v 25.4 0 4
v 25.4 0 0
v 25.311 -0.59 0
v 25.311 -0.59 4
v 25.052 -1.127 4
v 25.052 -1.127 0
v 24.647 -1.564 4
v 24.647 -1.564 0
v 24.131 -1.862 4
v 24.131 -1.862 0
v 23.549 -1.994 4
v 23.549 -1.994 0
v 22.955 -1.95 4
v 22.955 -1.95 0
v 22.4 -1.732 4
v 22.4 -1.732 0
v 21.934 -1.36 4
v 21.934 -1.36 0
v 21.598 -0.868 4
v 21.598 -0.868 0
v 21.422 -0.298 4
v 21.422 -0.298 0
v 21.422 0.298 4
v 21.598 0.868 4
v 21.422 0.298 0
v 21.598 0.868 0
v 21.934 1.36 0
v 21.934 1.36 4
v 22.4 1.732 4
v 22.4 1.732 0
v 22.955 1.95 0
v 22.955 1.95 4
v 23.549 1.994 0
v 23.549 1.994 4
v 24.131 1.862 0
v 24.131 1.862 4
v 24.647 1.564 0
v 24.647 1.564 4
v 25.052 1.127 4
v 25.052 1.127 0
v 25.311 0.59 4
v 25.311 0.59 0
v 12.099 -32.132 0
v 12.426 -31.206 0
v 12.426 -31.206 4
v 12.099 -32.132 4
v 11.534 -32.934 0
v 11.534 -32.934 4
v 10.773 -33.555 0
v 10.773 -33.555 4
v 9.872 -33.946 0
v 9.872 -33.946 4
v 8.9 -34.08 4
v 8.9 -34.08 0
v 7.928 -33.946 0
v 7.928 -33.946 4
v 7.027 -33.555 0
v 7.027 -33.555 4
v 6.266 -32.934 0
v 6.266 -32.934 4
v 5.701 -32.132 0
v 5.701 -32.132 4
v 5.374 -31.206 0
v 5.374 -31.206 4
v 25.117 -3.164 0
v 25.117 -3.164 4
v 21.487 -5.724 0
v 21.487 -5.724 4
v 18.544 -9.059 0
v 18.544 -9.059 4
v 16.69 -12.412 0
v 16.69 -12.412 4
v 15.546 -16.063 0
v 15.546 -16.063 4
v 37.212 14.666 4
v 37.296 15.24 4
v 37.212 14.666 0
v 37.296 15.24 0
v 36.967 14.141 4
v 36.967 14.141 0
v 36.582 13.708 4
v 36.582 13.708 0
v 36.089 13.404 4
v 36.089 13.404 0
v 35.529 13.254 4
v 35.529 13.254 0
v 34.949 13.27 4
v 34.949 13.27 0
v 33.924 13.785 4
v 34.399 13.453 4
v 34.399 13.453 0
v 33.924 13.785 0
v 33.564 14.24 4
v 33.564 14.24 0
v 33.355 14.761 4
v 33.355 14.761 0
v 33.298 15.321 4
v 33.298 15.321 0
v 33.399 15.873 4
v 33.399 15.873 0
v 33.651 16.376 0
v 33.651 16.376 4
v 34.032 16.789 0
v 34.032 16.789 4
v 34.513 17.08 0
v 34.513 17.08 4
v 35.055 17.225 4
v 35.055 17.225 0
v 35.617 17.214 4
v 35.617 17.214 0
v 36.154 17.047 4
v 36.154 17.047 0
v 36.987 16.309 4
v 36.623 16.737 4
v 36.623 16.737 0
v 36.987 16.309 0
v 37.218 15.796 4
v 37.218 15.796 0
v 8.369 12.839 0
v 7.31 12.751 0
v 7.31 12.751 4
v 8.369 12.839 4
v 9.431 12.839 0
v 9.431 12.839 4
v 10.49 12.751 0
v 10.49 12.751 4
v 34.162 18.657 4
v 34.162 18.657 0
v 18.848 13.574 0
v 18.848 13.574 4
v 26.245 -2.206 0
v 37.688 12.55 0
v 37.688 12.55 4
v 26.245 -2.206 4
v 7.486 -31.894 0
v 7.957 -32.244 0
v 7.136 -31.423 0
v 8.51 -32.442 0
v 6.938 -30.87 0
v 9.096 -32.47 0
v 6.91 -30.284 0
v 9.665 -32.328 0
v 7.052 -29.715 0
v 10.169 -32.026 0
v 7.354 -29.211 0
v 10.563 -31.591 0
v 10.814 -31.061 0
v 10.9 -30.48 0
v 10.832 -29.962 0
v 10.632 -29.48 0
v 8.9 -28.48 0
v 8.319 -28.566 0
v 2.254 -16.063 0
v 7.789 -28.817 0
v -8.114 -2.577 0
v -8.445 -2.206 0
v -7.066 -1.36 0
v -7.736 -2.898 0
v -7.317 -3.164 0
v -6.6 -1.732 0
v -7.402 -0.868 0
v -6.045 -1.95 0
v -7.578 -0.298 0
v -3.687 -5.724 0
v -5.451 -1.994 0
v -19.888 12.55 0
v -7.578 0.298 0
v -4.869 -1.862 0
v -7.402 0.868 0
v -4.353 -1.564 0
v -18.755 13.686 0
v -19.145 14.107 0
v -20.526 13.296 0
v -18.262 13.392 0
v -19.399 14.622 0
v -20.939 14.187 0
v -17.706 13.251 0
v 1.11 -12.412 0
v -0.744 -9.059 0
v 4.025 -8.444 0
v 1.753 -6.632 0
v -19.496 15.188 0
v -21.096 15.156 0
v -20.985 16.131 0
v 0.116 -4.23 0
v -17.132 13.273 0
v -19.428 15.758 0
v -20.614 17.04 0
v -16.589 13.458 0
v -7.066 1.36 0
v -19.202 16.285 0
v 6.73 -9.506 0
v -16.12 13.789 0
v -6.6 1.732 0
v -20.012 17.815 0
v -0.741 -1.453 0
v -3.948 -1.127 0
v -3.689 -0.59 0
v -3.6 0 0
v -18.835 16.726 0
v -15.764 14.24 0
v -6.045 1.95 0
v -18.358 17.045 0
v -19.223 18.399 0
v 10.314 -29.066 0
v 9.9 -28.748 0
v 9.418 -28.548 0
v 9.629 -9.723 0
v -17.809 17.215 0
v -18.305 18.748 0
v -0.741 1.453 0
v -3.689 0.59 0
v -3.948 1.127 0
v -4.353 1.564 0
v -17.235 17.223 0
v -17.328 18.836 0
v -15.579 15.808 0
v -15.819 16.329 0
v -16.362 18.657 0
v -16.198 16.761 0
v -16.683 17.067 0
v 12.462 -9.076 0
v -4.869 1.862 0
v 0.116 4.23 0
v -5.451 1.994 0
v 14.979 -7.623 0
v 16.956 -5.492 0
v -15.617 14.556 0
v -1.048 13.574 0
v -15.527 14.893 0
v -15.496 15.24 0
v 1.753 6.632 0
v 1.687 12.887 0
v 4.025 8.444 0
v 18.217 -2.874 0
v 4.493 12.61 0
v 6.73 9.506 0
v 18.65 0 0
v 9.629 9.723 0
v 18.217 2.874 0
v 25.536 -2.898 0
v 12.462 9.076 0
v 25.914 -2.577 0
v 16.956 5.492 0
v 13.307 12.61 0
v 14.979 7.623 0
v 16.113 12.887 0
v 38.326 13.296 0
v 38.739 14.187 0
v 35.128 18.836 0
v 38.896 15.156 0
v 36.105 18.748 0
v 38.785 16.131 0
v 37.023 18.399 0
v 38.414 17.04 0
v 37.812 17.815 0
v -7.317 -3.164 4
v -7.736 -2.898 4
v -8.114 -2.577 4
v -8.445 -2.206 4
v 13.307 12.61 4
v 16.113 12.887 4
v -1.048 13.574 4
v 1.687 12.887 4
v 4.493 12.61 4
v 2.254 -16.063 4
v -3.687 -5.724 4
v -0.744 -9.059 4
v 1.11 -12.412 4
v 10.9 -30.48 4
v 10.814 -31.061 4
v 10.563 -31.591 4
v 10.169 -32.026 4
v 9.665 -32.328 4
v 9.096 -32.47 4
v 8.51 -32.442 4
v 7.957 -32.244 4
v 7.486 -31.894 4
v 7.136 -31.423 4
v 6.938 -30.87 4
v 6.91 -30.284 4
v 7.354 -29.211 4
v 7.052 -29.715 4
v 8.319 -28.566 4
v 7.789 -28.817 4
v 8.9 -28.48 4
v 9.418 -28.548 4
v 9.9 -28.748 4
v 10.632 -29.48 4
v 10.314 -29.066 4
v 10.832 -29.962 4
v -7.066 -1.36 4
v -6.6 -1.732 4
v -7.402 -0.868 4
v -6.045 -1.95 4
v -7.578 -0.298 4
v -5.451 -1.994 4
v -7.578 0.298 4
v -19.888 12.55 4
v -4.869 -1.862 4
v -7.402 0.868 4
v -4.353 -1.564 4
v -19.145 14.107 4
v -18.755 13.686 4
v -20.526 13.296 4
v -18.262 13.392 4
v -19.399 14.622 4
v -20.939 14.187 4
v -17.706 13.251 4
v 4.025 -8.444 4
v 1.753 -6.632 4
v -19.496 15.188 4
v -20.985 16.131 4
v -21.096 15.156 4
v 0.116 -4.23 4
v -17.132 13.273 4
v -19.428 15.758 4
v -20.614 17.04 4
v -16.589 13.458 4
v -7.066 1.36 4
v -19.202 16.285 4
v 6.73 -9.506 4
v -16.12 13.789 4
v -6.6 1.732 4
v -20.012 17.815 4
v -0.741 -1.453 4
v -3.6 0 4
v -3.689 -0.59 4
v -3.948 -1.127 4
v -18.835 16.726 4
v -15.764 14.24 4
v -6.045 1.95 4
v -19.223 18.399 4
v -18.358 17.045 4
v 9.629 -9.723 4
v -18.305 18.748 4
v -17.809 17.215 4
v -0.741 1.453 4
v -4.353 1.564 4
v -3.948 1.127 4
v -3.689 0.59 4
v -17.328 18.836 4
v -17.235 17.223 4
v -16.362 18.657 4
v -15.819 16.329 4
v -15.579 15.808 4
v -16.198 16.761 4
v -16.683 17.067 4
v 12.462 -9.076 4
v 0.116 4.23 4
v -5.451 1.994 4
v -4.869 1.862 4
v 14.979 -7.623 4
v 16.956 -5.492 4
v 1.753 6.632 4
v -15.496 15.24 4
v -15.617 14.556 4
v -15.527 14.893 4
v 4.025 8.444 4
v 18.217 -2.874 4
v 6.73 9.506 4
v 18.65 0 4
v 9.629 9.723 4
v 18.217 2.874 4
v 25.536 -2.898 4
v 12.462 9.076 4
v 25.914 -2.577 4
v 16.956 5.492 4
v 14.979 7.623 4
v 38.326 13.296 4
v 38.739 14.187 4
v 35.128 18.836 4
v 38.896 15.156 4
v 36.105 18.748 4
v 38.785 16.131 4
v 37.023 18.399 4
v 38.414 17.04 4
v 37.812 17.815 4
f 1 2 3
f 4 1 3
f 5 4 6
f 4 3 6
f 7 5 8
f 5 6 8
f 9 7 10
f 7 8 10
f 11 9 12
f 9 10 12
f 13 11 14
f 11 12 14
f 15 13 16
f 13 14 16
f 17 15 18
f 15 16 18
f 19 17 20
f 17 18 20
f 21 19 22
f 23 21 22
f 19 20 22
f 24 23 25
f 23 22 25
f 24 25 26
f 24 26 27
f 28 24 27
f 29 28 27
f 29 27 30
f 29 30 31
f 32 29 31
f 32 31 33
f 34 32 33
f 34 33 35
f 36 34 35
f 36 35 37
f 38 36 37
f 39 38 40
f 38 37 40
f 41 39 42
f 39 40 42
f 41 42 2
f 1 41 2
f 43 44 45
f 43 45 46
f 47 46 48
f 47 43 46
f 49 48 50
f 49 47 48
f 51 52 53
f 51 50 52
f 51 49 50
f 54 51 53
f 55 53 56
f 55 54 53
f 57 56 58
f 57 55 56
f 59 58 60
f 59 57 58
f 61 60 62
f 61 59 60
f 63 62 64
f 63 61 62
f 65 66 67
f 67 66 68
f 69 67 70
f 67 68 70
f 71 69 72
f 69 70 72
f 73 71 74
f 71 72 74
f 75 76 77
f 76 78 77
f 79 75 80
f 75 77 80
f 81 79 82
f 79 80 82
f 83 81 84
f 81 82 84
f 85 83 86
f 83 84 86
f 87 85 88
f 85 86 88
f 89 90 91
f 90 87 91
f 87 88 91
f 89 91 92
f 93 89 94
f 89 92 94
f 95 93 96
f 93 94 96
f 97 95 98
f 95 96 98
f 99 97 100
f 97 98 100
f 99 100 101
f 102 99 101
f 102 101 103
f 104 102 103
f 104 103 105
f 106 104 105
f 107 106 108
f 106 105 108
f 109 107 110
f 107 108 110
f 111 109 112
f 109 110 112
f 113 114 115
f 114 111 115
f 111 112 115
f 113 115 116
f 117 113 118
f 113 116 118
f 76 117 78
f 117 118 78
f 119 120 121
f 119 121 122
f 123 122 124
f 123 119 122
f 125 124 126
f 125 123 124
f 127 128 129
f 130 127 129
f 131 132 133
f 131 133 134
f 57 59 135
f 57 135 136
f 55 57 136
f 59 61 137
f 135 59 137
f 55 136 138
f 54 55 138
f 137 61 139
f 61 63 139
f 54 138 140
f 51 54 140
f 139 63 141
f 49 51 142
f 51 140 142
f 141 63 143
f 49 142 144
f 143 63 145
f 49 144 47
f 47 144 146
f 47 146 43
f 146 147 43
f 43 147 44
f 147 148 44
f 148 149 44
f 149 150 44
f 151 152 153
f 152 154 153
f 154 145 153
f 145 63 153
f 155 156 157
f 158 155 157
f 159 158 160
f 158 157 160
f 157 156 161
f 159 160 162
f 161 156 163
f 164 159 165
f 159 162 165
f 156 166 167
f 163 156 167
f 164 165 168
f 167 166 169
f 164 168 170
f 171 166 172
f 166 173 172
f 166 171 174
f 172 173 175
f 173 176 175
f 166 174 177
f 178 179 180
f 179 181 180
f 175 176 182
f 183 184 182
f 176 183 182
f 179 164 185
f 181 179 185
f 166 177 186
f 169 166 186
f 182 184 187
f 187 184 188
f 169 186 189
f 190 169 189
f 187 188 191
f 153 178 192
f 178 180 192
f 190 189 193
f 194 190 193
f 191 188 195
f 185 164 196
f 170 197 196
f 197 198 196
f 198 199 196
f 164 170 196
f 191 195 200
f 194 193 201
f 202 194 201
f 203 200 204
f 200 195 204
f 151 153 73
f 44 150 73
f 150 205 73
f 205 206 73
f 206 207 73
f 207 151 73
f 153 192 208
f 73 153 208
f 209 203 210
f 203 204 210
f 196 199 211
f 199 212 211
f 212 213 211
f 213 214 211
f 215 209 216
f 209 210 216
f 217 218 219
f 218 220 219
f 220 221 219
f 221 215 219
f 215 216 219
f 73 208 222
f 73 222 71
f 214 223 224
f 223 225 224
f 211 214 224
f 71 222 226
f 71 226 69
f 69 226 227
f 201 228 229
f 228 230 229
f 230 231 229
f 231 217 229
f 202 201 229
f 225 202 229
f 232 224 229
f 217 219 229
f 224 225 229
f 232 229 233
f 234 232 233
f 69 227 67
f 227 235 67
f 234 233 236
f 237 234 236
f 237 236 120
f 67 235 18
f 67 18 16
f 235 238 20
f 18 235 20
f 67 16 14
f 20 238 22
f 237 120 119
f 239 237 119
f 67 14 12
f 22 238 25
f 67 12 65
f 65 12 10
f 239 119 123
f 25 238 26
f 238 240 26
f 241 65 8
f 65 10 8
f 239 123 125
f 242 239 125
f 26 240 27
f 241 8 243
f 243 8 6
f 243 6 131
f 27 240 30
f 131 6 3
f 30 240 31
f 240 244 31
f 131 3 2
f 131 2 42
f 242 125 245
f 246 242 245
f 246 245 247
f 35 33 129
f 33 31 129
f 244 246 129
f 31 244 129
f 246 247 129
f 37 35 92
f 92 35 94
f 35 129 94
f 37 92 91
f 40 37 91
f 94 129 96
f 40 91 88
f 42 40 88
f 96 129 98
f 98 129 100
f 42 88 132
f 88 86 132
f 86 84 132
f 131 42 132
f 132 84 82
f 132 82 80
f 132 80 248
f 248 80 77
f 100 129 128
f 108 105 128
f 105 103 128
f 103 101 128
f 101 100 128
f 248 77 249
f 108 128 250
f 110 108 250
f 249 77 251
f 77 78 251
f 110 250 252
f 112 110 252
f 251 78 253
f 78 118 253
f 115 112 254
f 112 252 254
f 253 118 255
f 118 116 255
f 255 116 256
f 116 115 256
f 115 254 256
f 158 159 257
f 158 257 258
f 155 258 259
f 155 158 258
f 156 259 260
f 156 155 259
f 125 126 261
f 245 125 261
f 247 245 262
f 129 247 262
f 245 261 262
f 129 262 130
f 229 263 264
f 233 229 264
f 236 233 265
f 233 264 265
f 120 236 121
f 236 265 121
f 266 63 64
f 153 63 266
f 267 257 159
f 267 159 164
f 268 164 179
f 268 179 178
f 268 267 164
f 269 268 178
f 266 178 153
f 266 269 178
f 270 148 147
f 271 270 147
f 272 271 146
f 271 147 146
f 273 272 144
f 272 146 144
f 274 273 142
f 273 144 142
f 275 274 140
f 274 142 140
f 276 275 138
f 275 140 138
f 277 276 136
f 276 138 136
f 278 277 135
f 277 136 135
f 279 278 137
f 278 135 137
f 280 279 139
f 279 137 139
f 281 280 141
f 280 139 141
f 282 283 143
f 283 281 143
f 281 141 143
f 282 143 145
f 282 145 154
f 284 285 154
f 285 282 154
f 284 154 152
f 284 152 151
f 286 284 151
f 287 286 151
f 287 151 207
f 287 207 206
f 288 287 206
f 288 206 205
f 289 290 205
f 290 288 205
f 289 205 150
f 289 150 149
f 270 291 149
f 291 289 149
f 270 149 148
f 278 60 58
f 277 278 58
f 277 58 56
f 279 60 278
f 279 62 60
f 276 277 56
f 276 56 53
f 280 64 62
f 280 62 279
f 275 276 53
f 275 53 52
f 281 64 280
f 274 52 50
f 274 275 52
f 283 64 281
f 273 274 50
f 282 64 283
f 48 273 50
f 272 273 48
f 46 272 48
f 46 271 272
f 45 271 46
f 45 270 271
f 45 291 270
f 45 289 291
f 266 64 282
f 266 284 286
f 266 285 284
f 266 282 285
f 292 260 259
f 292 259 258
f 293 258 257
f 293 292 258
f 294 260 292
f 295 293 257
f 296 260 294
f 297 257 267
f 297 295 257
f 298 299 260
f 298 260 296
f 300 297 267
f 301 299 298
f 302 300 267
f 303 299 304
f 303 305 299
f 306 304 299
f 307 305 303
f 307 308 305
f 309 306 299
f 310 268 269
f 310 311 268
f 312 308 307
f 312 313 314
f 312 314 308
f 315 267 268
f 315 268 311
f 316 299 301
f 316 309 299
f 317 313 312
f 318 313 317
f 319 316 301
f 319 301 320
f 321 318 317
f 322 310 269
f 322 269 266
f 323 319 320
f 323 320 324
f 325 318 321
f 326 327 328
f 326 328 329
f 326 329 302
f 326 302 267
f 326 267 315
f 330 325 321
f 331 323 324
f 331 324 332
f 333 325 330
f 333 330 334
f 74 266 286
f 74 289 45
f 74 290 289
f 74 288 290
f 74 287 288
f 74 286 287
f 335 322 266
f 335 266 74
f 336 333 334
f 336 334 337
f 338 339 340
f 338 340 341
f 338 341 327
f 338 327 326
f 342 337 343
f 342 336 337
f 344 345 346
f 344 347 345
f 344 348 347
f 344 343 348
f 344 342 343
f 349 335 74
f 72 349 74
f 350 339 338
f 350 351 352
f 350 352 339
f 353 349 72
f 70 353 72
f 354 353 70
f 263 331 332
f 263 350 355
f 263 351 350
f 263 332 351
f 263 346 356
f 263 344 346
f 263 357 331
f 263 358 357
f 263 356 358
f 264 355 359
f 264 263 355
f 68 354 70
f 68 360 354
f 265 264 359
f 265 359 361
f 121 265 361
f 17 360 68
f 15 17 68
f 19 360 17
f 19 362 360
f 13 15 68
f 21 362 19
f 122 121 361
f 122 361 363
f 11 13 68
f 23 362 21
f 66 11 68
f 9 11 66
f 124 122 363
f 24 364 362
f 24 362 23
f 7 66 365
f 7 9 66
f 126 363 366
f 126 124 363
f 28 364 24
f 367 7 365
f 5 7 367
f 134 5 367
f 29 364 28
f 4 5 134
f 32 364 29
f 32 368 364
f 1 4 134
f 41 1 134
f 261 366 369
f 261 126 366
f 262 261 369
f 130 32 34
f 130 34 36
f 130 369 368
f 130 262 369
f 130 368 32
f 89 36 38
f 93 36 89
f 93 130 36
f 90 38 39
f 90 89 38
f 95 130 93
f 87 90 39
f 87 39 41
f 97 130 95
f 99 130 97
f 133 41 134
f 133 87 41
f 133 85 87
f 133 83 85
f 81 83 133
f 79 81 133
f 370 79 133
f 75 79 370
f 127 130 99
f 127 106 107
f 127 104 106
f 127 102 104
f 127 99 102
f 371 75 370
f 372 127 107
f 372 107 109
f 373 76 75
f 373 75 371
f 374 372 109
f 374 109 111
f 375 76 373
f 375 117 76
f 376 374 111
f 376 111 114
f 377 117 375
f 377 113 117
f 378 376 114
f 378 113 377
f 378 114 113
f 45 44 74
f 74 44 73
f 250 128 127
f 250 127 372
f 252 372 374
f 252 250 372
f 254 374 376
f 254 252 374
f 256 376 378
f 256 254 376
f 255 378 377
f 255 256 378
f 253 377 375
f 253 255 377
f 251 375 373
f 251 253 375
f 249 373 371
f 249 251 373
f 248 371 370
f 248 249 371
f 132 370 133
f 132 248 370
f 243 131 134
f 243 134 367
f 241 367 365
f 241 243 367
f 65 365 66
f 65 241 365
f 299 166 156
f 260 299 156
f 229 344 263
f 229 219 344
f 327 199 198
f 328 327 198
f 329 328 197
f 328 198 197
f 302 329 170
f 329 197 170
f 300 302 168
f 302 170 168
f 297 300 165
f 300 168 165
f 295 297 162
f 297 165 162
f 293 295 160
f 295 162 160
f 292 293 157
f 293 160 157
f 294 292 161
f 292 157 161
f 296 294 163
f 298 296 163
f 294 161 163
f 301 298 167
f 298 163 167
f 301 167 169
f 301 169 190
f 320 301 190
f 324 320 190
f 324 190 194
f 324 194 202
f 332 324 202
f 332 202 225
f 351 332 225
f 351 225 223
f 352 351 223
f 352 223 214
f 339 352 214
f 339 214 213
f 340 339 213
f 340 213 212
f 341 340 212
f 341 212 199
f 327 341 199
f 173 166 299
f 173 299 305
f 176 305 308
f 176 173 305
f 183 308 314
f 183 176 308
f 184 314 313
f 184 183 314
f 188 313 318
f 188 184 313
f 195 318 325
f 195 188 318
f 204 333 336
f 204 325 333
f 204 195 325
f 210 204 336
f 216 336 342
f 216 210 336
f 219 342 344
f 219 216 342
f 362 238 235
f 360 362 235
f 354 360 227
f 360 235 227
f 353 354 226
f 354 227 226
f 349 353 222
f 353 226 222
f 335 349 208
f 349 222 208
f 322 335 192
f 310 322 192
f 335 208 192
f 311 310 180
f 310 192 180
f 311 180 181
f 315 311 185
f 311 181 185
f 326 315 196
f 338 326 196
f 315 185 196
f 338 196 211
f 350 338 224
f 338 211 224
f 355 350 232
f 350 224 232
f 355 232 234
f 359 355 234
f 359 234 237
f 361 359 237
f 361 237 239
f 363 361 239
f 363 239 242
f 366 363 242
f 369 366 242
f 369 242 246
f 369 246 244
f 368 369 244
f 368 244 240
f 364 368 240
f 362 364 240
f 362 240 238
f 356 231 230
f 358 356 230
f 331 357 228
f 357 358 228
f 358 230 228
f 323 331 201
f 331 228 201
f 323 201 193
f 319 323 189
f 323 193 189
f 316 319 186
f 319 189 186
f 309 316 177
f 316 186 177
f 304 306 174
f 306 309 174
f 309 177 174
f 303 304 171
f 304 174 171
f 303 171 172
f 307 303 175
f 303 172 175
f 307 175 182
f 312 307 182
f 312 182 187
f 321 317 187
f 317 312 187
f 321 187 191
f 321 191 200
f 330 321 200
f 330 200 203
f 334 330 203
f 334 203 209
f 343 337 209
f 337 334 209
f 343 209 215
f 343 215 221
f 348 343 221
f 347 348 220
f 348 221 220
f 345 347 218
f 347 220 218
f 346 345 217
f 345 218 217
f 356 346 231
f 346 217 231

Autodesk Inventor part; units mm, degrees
ref_plane "YZ Plane" through (0, 0, 0) normal (1, 0, 0) x (0, 1, 0)
ref_plane "XZ Plane" through (0, 0, 0) normal (0, 1, 0) x (-1, 0, 0)
ref_plane "XY Plane" through (0, 0, 0) normal (0, 0, 1) x (1, 0, 0)
sketch "Sketch1" plane through (0, 0, 0) normal (0, 0, 1) x (1, 0, 0)
  circle A0 centre (8.9, 0) radius 18.65 projected
  circle A1 centre (23.4, 0) radius 1.65 projected
  circle A2 centre (-5.6, 0) radius 1.65 projected
  arc A3 (13.951, -13.4327) -> (21.5237, -6.826) centre (8.9, 0) ccw projected
  arc A4 (22.3604, -6.5571) -> (21.5237, -6.826) centre (22.0823, -7.128) ccw projected
  line L0 (22.3604, -6.5571) -> (23.5602, -7.1416) projected
  arc A5 (23.8417, -8.0126) -> (23.5602, -7.1416) centre (23.2821, -7.7125) ccw projected
  arc A6 (14.8123, -15.8902) -> (23.8417, -8.0126) centre (8.9, 0) ccw projected
  arc A7 (13.9876, -15.4932) -> (14.8123, -15.8902) centre (14.5909, -15.2951) ccw projected
  line L1 (13.9876, -15.4932) -> (13.5712, -14.2252) projected
  arc A8 (13.951, -13.4327) -> (13.5712, -14.2252) centre (14.1745, -14.0271) ccw projected
  line L2 (-4.5604, 6.5571) -> (-5.7602, 7.1416) projected
  arc A9 (-6.0417, 8.0126) -> (-5.7602, 7.1416) centre (-5.4821, 7.7125) ccw projected
  arc A10 (2.9877, 15.8902) -> (-6.0417, 8.0126) centre (8.9, 0) ccw projected
  arc A11 (3.8124, 15.4932) -> (2.9877, 15.8902) centre (3.2091, 15.2951) ccw projected
  line L3 (3.8124, 15.4932) -> (4.2288, 14.2252) projected
  arc A12 (3.849, 13.4327) -> (4.2288, 14.2252) centre (3.6255, 14.0271) ccw projected
  arc A13 (3.849, 13.4327) -> (-3.7237, 6.826) centre (8.9, 0) ccw projected
  arc A14 (-4.5604, 6.5571) -> (-3.7237, 6.826) centre (-4.2823, 7.128) ccw projected
  circle A15 centre (8.9, 0) radius 8.75 projected
  line L4 (22.3604, 6.5571) -> (23.5602, 7.1416) projected
  arc A16 (21.5237, 6.826) -> (22.3604, 6.5571) centre (22.0823, 7.128) ccw projected
  arc A17 (21.5237, 6.826) -> (13.951, 13.4327) centre (8.9, 0) ccw projected
  arc A18 (13.5712, 14.2252) -> (13.951, 13.4327) centre (14.1745, 14.0271) ccw projected
  line L5 (13.9876, 15.4932) -> (13.5712, 14.2252) projected
  arc A19 (14.8123, 15.8902) -> (13.9876, 15.4932) centre (14.5909, 15.2951) ccw projected
  arc A20 (23.8417, 8.0126) -> (14.8123, 15.8902) centre (8.9, 0) ccw projected
  arc A21 (23.5602, 7.1416) -> (23.8417, 8.0126) centre (23.2821, 7.7125) ccw projected
  line L6 (-4.5604, -6.5571) -> (-5.7602, -7.1416) projected
  arc A22 (-3.7237, -6.826) -> (-4.5604, -6.5571) centre (-4.2823, -7.128) ccw projected
  arc A23 (-3.7237, -6.826) -> (3.849, -13.4327) centre (8.9, 0) ccw projected
  arc A24 (4.2288, -14.2252) -> (3.849, -13.4327) centre (3.6255, -14.0271) ccw projected
  line L7 (3.8124, -15.4932) -> (4.2288, -14.2252) projected
  arc A25 (2.9877, -15.8902) -> (3.8124, -15.4932) centre (3.2091, -15.2951) ccw projected
  arc A26 (-6.0417, -8.0126) -> (2.9877, -15.8902) centre (8.9, 0) ccw projected
  arc A27 (-5.7602, -7.1416) -> (-6.0417, -8.0126) centre (-5.4821, -7.7125) ccw projected
  circle A28 centre (-5.6, 0) radius 1.65
  circle A29 centre (23.4, 0) radius 1.65
  circle A30 centre (8.9, 0) radius 9.75
  line L8 (8.9, 0) -> (8.9, -30.48)
  circle A31 centre (8.9, -30.48) radius 2
  circle A32 centre (8.9, -30.48) radius 3.6
  line L9 (5.374, -31.2064) -> (-0.6495, -1.9673)
  line L10 (12.426, -31.2064) -> (18.4495, -1.9673)
  circle A33 centre (35.2965, 15.24) radius 2
  circle A34 centre (35.2965, 15.24) radius 3.6
  line L11 (8.9, 0) -> (35.2965, 15.24)
  line L12 (34.1625, 18.6568) -> (5.829, 9.2537)
  line L13 (37.6885, 12.5496) -> (15.3784, -7.2864)
  circle A35 centre (-17.4965, 15.24) radius 2
  circle A36 centre (-17.4965, 15.24) radius 3.6
  line L14 (8.9, 0) -> (-17.4965, 15.24)
  line L15 (-19.8885, 12.5496) -> (2.4216, -7.2864)
  line L16 (-16.3625, 18.6568) -> (11.971, 9.2537)
  circle A37 centre (-5.6, 0) radius 2
  circle A38 centre (-5.6, 0) radius 3.6
  circle A39 centre (23.4, 0) radius 2
  circle A40 centre (23.4, 0) radius 3.6
  line L17 (0.0034, -5.1364) -> (-6.4857, -3.4893)
  line L18 (-19.8885, 12.5496) -> (-8.4448, -2.2062)
  line L19 (37.6885, 12.5496) -> (26.2448, -2.2062)
  line L20 (17.7966, -5.1364) -> (24.2857, -3.4893)
  circle A41 centre (8.9, 0) radius 12.85
  point P0 (0, 0)
  point P1 (15.6508, -15.5526)
  point P2 (16.3247, -12.2811)
  point P3 (8.9, 10.2729)
  point P4 (1.4753, -12.2811)
  point P5 (2.1492, -15.5526)
  point P6 (13.7731, 11.8901)
  point P7 (4.0269, 11.8901)
  point P8 (16.7606, -10.1653)
  point P9 (21.001, -4.3231)
  point P10 (-3.201, -4.3231)
  point P11 (1.0394, -10.1653)
  dimension "d0" = 1
  dimension "d1" = 4
  dimension "d2" = 7.2
  dimension "d3" = 30.48
  dimension "d6" = 360
  dimension "d8" = 4
  dimension "d9" = 7.2
  dimension "d10" = 4
  dimension "d11" = 7.2
extrude "Extrusion1" add sketch "Sketch1" along normal blind 4 contours A0 L19 A40 L13 | A0 L13 L19 | L13 A40 A41 L11 A17 A16 L4 A21 A20 A0 | A0 L11 A34 L13 | L11 A20 L12 A0 | A0 L12 A34 L11 | A34 | A40 A41 L13 A39 | L13 A39 A41 A40 | L10 A32 L8 A0 | A0 L8 A41 L10 A3 A8 L1 A7 A6 | L11 A17 L12 A20 | A20 A21 L4 A16 A17 L11 | A41 A39 L13 A40 | A40 L13 L10 A30 L11 A41 | L8 A32 L9 A0 | A0 L9 A26 A25 L7 A24 A23 A41 L8 | A32 | A6 A7 L1 A8 A3 L10 | L20 A41 A40 | L16 A10 L14 A0 | A0 L14 A36 L16 | L11 A41 L12 A17 | A40 A41 L20 L13 | L13 A41 A40 | L11 A30 L16 L12 A41 | A41 L9 L15 A30 L8 | L8 A30 L13 L10 A41 | A41 L10 L20 | L14 A10 A9 L2 A14 A13 A41 A38 L15 A0 | A0 L15 A36 L14 | A36 | L16 A13 L14 A10 | L13 A41 A39 | L13 A30 L10 | L12 L16 A41 | L18 L15 A0 | A0 L15 A38 L18 | L9 A23 A24 L7 A25 A26 | A41 L17 L9 | L14 A13 A14 L2 A9 A10 | L16 A41 L14 A13 | A30 L12 L16 | L12 A30 L14 A41 L16 | A38 L15 A37 A41 | L15 L9 A30 | L15 A38 A41 L14 A30 L9 | L17 A41 A38 L15 | L17 A38 A41 | A38 A41 A37 L15 | A38 A41 L15 | L15 A41 A37 A38 | L15 A37 A41
fillet "Fillet1" radius 19.05 6 edges at (-3.201, -4.3231, 2) (1.0394, -10.1653, 2) (4.0269, 11.8901, 2) (13.7731, 11.8901, 2) (21.001, -4.3231, 2) (16.7606, -10.1653, 2)
sketch "Sketch2" plane through (0, 0, 4) normal (0, 0, 1) x (1, 0, 0)
  arc A0 (5.4731, -1.5453) -> (4.2552, -2.5573) centre (5.9714, -3.384) ccw projected
  arc A1 (4.2552, -2.5573) -> (4.6178, -3.1268) centre (8.9, 0) ccw projected
  arc A2 (4.6178, -3.1268) -> (6.05, -2.4513) centre (4.5948, -1.2219) ccw projected
  arc A3 (6.05, -2.4513) -> (6.7049, -3.0517) centre (8.9, 0) ccw projected
  arc A4 (6.7049, -3.0517) -> (6.1561, -4.5371) centre (8.0558, -4.3949) ccw projected
  arc A5 (6.1561, -4.5371) -> (6.7549, -4.849) centre (8.9, 0) ccw projected
  arc A6 (6.7549, -4.849) -> (7.6574, -3.5479) centre (5.7825, -3.2108) ccw projected
  arc A7 (7.6574, -3.5479) -> (8.5249, -3.7404) centre (8.9, 0) ccw projected
  arc A8 (8.5249, -3.7404) -> (8.7922, -5.3012) centre (10.3664, -4.2282) ccw projected
  arc A9 (8.7922, -5.3012) -> (9.4668, -5.2719) centre (8.9, 0) ccw projected
  arc A10 (9.4668, -5.2719) -> (9.5979, -3.6939) centre (7.8056, -4.3394) ccw projected
  arc A11 (9.5979, -3.6939) -> (10.4453, -3.4269) centre (8.9, 0) ccw projected
  arc A12 (10.4453, -3.4269) -> (11.4573, -4.6448) centre (12.284, -2.9286) ccw projected
  arc A13 (11.4573, -4.6448) -> (12.0268, -4.2822) centre (8.9, 0) ccw projected
  arc A14 (12.0268, -4.2822) -> (11.3513, -2.85) centre (10.1219, -4.3052) ccw projected
  arc A15 (11.3513, -2.85) -> (11.9517, -2.1951) centre (8.9, 0) ccw projected
  arc A16 (11.9517, -2.1951) -> (13.4371, -2.7439) centre (13.2949, -0.8442) ccw projected
  arc A17 (13.4371, -2.7439) -> (13.749, -2.1451) centre (8.9, 0) ccw projected
  arc A18 (13.749, -2.1451) -> (12.4479, -1.2426) centre (12.1108, -3.1175) ccw projected
  arc A19 (12.4479, -1.2426) -> (12.6404, -0.3751) centre (8.9, 0) ccw projected
  arc A20 (12.6404, -0.3751) -> (14.2012, -0.1078) centre (13.1282, 1.4664) ccw projected
  arc A21 (14.2012, -0.1078) -> (14.1719, 0.5668) centre (8.9, 0) ccw projected
  arc A22 (14.1719, 0.5668) -> (12.5939, 0.6979) centre (13.2394, -1.0944) ccw projected
  arc A23 (12.5939, 0.6979) -> (12.3269, 1.5453) centre (8.9, 0) ccw projected
  arc A24 (12.3269, 1.5453) -> (13.5448, 2.5573) centre (11.8286, 3.384) ccw projected
  arc A25 (13.5448, 2.5573) -> (13.1822, 3.1268) centre (8.9, 0) ccw projected
  arc A26 (13.1822, 3.1268) -> (11.75, 2.4513) centre (13.2052, 1.2219) ccw projected
  arc A27 (11.75, 2.4513) -> (11.0951, 3.0517) centre (8.9, 0) ccw projected
  arc A28 (11.0951, 3.0517) -> (11.6439, 4.5371) centre (9.7442, 4.3949) ccw projected
  arc A29 (11.6439, 4.5371) -> (11.0451, 4.849) centre (8.9, 0) ccw projected
  arc A30 (11.0451, 4.849) -> (10.1426, 3.5479) centre (12.0175, 3.2108) ccw projected
  arc A31 (10.1426, 3.5479) -> (9.2751, 3.7404) centre (8.9, 0) ccw projected
  arc A32 (9.2751, 3.7404) -> (9.0078, 5.3012) centre (7.4336, 4.2282) ccw projected
  arc A33 (9.0078, 5.3012) -> (8.3332, 5.2719) centre (8.9, 0) ccw projected
  arc A34 (8.3332, 5.2719) -> (8.2021, 3.6939) centre (9.9944, 4.3394) ccw projected
  arc A35 (8.2021, 3.6939) -> (7.3547, 3.4269) centre (8.9, 0) ccw projected
  arc A36 (7.3547, 3.4269) -> (6.3427, 4.6448) centre (5.516, 2.9286) ccw projected
  arc A37 (6.3427, 4.6448) -> (5.7732, 4.2822) centre (8.9, 0) ccw projected
  arc A38 (5.7732, 4.2822) -> (6.4487, 2.85) centre (7.6781, 4.3052) ccw projected
  arc A39 (6.4487, 2.85) -> (5.8483, 2.1951) centre (8.9, 0) ccw projected
  arc A40 (5.8483, 2.1951) -> (4.3629, 2.7439) centre (4.5051, 0.8442) ccw projected
  arc A41 (4.3629, 2.7439) -> (4.051, 2.1451) centre (8.9, 0) ccw projected
  arc A42 (4.051, 2.1451) -> (5.3521, 1.2426) centre (5.6892, 3.1175) ccw projected
  arc A43 (5.3521, 1.2426) -> (5.1596, 0.3751) centre (8.9, 0) ccw projected
  arc A44 (5.1596, 0.3751) -> (3.5988, 0.1078) centre (4.6718, -1.4664) ccw projected
  arc A45 (3.5988, 0.1078) -> (3.6281, -0.5668) centre (8.9, 0) ccw projected
  arc A46 (3.6281, -0.5668) -> (5.2061, -0.6979) centre (4.5606, 1.0944) ccw projected
  arc A47 (5.2061, -0.6979) -> (5.4731, -1.5453) centre (8.9, 0) ccw projected
  circle A48 centre (8.9, 0) radius 2.7343 projected
  circle A49 centre (8.9, 27.5717) radius 23.8125
  circle A50 centre (8.9, 0) radius 3.7592
  line L0 (4.1375, 24.8221) -> (4.1375, 30.3213)
  line L1 (4.1375, 30.3213) -> (8.9, 33.071)
  line L2 (8.9, 33.071) -> (13.6625, 30.3213)
  line L3 (13.6625, 30.3213) -> (13.6625, 24.8221)
  line L4 (13.6625, 24.8221) -> (8.9, 22.0724)
  line L5 (8.9, 22.0724) -> (4.1375, 24.8221)
  line L6 (13.6625, 24.8221) -> (4.1375, 30.3213)
  line L7 (8.9, 33.071) -> (8.9, 22.0724)
  line L8 (4.1375, 24.8221) -> (13.6625, 30.3213)
  point P0 (0, 0)
  dimension "d15" = 47.625
  dimension "d16" = 9.525
  dimension "d17" = 9.525
  dimension "d18" = 9.525
properties part number "MotorHolder"
